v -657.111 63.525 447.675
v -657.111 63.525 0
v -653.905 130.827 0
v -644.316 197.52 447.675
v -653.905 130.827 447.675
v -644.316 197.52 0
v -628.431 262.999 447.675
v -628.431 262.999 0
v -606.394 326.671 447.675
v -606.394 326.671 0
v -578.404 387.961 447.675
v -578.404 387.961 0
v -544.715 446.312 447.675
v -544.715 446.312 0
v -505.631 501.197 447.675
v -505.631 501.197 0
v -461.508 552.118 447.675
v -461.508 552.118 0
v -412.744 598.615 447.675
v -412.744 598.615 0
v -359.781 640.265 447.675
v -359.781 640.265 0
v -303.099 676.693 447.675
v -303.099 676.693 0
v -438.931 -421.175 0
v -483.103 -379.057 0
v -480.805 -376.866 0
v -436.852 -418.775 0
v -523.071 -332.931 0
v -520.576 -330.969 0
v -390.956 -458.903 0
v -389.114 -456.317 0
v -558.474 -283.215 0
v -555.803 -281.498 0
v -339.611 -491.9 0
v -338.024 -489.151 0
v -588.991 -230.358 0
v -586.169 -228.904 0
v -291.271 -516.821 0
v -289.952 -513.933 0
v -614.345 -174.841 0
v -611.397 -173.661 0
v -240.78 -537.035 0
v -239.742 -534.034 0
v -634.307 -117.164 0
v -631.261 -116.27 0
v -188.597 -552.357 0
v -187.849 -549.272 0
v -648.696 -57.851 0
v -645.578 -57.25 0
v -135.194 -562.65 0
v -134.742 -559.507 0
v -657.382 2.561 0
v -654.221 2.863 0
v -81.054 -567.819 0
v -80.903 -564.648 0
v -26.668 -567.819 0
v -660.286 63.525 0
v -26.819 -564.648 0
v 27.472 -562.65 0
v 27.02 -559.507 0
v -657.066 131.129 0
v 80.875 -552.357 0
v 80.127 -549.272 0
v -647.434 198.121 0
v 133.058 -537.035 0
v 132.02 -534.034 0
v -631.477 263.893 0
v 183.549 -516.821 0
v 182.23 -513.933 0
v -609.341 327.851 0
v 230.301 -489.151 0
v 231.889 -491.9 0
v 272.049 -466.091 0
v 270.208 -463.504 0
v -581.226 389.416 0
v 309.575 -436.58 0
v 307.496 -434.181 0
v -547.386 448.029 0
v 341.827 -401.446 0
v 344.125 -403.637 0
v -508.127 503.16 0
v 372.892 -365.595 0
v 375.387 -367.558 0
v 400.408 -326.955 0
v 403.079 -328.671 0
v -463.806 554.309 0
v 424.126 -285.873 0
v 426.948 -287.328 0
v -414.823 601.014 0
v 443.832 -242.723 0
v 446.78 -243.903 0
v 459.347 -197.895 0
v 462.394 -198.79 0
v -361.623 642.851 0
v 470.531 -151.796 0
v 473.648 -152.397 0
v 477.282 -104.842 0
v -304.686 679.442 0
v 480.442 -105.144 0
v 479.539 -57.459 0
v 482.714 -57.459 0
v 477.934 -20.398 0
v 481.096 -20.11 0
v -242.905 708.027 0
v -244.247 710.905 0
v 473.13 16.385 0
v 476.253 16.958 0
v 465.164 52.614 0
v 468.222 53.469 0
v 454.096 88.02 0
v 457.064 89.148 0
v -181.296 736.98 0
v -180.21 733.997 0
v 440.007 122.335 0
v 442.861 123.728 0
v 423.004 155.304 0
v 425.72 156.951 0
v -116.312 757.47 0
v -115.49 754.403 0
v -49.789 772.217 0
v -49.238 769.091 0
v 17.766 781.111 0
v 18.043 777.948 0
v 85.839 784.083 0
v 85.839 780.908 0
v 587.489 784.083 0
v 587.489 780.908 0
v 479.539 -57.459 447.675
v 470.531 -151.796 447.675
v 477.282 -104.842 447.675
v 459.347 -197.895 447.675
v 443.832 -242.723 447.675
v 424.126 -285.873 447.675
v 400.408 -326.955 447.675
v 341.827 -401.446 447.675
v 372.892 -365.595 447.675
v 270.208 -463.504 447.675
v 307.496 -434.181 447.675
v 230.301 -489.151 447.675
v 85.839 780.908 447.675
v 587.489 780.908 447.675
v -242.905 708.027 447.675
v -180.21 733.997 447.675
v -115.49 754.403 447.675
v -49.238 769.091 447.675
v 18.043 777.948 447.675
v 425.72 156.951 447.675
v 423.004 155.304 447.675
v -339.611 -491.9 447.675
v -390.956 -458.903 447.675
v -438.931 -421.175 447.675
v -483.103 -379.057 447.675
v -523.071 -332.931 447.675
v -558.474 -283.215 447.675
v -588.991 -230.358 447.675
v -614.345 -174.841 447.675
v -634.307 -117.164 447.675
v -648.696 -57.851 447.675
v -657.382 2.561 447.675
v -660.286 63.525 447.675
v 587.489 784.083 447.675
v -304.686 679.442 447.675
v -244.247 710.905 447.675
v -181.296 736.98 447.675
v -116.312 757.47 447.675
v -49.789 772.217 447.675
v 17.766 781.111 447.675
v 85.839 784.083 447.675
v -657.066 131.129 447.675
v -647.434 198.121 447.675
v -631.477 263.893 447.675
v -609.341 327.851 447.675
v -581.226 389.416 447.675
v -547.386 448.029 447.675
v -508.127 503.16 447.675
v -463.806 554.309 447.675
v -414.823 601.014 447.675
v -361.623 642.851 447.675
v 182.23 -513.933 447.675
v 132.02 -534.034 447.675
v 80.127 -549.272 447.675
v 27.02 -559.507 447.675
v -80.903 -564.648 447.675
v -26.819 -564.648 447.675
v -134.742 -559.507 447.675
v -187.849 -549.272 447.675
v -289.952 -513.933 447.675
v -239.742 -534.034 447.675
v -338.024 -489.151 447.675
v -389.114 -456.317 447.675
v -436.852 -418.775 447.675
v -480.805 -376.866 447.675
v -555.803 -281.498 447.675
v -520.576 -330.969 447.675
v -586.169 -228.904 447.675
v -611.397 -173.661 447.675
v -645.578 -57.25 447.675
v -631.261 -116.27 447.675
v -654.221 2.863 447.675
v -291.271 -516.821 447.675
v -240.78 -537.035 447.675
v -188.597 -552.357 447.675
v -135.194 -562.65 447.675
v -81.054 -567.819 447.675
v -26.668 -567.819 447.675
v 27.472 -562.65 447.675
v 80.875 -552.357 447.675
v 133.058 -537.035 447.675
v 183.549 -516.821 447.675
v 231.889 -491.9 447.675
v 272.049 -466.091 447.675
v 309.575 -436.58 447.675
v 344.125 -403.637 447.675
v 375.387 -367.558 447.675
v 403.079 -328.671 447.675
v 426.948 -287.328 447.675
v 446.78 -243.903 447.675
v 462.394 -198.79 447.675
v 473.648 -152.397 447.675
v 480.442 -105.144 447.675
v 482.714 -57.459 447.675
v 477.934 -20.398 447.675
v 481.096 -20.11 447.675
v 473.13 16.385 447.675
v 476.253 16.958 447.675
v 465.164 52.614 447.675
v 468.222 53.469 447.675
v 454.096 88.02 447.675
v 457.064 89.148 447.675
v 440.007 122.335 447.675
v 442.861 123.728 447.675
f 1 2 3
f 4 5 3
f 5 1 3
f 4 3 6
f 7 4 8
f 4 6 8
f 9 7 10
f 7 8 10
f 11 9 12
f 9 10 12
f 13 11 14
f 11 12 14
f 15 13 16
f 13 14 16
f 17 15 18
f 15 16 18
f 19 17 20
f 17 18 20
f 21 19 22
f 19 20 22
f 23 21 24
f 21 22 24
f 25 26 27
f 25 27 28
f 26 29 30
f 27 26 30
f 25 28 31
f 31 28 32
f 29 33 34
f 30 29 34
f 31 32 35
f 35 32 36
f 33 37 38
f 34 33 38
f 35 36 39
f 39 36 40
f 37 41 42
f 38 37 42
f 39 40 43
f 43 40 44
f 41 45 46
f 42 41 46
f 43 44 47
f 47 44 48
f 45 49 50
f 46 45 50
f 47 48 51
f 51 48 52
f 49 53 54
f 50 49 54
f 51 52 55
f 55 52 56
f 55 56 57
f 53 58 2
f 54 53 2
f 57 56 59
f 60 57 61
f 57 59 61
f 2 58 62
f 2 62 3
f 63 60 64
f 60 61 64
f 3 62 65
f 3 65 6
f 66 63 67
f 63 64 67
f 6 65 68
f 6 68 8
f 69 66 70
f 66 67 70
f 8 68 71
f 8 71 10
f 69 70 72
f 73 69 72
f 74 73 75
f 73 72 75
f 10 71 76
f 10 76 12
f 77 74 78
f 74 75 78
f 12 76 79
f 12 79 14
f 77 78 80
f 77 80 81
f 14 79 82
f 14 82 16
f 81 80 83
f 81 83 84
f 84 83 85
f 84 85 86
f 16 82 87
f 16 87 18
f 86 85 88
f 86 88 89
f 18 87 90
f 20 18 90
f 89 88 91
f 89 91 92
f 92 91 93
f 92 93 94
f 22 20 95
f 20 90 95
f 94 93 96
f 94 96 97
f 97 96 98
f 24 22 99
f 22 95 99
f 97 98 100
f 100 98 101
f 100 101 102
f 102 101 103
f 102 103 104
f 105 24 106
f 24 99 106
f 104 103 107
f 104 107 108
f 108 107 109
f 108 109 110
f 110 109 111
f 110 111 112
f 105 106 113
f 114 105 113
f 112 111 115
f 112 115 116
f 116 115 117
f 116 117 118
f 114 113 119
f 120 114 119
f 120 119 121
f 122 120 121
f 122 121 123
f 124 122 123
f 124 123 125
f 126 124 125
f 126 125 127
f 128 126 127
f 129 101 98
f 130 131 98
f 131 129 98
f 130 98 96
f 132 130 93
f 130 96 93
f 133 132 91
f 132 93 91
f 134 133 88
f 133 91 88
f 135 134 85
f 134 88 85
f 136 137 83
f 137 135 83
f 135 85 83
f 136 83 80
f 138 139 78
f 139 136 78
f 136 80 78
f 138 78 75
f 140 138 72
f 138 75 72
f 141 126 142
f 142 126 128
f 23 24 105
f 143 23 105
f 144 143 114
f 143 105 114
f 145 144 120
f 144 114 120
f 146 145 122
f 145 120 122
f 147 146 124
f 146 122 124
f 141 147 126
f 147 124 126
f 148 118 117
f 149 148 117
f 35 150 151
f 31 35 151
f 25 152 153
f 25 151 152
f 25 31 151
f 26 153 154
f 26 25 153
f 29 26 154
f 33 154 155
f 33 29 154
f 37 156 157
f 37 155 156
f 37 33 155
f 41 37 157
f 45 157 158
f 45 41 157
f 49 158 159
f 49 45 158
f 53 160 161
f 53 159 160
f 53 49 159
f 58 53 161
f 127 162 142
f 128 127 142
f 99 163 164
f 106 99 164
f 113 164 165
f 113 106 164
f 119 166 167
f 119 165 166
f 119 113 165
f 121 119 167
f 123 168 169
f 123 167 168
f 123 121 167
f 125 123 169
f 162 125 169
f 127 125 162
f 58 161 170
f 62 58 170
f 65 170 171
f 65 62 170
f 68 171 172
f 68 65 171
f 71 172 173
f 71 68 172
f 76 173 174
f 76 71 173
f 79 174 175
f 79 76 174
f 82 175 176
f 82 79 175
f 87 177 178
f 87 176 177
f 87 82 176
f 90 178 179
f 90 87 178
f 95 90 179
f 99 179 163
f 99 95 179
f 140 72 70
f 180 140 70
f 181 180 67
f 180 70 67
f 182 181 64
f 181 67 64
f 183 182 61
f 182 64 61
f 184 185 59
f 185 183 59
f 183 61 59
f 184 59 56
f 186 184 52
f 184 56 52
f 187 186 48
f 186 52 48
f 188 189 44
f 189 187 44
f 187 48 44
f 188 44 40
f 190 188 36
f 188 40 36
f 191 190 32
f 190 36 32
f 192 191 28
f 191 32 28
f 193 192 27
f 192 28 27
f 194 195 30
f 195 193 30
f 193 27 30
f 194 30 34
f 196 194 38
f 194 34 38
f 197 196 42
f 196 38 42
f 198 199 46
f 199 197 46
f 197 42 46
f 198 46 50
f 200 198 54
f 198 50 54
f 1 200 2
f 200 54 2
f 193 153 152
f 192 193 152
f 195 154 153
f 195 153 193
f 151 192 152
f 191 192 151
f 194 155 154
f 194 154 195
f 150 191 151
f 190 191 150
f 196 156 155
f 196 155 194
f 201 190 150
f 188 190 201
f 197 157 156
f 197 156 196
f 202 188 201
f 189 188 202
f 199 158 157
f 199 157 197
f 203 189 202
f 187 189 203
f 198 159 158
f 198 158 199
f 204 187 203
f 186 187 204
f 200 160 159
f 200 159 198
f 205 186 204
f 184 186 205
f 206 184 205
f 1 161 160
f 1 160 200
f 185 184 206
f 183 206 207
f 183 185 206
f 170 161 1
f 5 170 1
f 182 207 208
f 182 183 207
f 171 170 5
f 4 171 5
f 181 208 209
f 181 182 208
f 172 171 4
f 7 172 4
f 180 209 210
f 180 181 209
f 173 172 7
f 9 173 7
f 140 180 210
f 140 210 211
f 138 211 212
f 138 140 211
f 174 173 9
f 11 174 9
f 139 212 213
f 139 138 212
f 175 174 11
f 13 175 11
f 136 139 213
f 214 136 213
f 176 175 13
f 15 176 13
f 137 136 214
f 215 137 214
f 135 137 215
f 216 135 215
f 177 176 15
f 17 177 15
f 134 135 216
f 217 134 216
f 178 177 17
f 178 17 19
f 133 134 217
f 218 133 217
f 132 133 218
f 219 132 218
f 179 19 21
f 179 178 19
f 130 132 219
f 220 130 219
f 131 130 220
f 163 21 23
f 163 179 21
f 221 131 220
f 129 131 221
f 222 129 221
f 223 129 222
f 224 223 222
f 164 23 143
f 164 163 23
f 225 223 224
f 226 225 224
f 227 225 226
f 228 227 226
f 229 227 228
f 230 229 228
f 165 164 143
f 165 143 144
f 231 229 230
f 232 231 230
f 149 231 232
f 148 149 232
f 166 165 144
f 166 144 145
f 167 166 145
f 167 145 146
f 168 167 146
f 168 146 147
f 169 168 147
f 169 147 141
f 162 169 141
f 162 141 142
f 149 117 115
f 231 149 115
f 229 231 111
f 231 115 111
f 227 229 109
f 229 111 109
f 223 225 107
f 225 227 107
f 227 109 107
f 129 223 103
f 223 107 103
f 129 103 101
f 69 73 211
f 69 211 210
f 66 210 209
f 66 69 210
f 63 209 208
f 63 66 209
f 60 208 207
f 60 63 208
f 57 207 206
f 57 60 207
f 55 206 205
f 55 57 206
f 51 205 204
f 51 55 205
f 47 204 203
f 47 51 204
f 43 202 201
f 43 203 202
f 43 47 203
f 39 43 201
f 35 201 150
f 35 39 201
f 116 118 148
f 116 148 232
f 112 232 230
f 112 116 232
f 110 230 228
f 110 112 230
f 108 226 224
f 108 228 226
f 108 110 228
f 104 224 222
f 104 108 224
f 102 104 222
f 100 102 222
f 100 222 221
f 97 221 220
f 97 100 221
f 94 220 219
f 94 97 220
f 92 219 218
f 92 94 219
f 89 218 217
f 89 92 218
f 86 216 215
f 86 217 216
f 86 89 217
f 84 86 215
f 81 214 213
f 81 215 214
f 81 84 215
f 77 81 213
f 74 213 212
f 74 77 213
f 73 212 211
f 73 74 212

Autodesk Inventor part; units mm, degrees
ref_plane "YZ Plane" through (0, 0, 0) normal (1, 0, 0) x (0, 1, 0)
ref_plane "XZ Plane" through (0, 0, 0) normal (0, 1, 0) x (-1, 0, 0)
ref_plane "XY Plane" through (0, 0, 0) normal (0, 0, 1) x (1, 0, 0)
sketch "Sketch1" plane through (0, 0, 0) normal (0, 0, 1) x (1, 0, 0)
  circle A0 centre (15.9889, 3.0332) radius 69.85 construction
  line L0 (85.8389, 3.0332) -> (50.9139, -57.4587) construction
  line L1 (50.9139, -57.4587) -> (-18.9361, -57.4587) construction
  line L2 (-18.9361, -57.4587) -> (-53.8611, 3.0332) construction
  line L3 (-53.8611, 3.0332) -> (-18.9361, 63.5251) construction
  line L4 (-18.9361, 63.5251) -> (50.9139, 63.5251) construction
  line L5 (50.9139, 63.5251) -> (85.8389, 3.0332) construction
  line L6 (85.8389, 3.0332) -> (85.8389, 780.9082) construction
  line L7 (85.8389, 3.0332) -> (85.8389, 3.0332) construction
  line L8 (-53.8611, 3.0332) -> (85.8389, 3.0332) construction
  arc A1 (85.8389, 780.9082) -> (-303.0986, 676.6927) centre (85.8389, 3.0332) ccw
  arc A2 (-303.0986, 676.6927) -> (-657.1111, 63.5251) centre (50.9139, 63.5251) ccw
  arc A3 (-657.1111, 63.5251) -> (-338.0236, -489.1507) centre (-18.9361, 63.5251) ccw
  arc A4 (-338.0236, -489.1507) -> (230.3014, -489.1507) centre (-53.8611, 3.0332) ccw
  arc A5 (230.3014, -489.1507) -> (479.5389, -57.4587) centre (-18.9361, -57.4587) ccw
  line L9 (85.8389, 780.9082) -> (587.4889, 780.9082)
  circle A6 centre (435.5017, 175.6262) radius 21.082 construction
  line L10 (50.9139, -57.4587) -> (435.5017, 175.6262) construction
  line L11 (85.8389, 784.0832) -> (587.4889, 784.0832)
  arc A7 (85.8389, 784.0832) -> (-304.6861, 679.4423) centre (85.8389, 3.0332) ccw
  arc A8 (-304.6861, 679.4423) -> (-660.2861, 63.5251) centre (50.9139, 63.5251) ccw
  arc A9 (-660.2861, 63.5251) -> (-339.6111, -491.9003) centre (-18.9361, 63.5251) ccw
  arc A10 (-339.6111, -491.9003) -> (231.8889, -491.9003) centre (-53.8611, 3.0332) ccw
  arc A11 (231.8889, -491.9003) -> (482.7139, -57.4587) centre (-18.9361, -57.4587) ccw
  line L12 (587.4889, 784.0832) -> (587.4889, 780.9082)
  line L13 (15.9889, 72.8832) -> (15.9889, -66.8168) construction
  line L14 (425.7203, 156.9507) -> (423.0042, 155.3045)
  arc A12 (482.7139, -57.4587) -> (425.7203, 156.9507) centre (50.9139, -57.4587) ccw
  arc A13 (479.5389, -57.4587) -> (423.0042, 155.3045) centre (50.9139, -57.4587) ccw
  arc A14 (423.0042, 155.3045) -> (417.4725, 164.6993) centre (50.9139, -57.4587) ccw construction
  dimension "d2" = 42.164
  dimension "d1" = 777.875
  dimension "d3" = 172.593
  dimension "d5" = 449.707
  dimension "d6" = 3.175
  dimension "d8" = 571.5
  dimension "d9" = 428.625
extrude "Extrusion1" add sketch "Sketch1" along normal blind 447.675
ref_plane "Work Plane1" through (587.4889, 784.0832, 223.8375) normal (0, 0, 1) x (1, 0, 0)
equation "\"d5\" = d4 + 0.5 * d2"
equation "\"BendRadius\" = Thickness"
equation "\"BendReliefWidth\" = Thickness"
equation "\"BendReliefDepth\" = 0.5 * Thickness"
equation "\"CornerReliefSize\" = 4 * Thickness"
equation "\"MinimumRemnant\" = 2 * Thickness"
equation "\"TransitionRadius\" = BendRadius"
equation "\"JacobiRadiusSize\" = Thickness"
equation "\"GapSize\" = Thickness"
equation "\"d4\" = 428.625"
equation "\"Thickness\" = 3.175"
properties part number "band" material "Steel, Mild"
